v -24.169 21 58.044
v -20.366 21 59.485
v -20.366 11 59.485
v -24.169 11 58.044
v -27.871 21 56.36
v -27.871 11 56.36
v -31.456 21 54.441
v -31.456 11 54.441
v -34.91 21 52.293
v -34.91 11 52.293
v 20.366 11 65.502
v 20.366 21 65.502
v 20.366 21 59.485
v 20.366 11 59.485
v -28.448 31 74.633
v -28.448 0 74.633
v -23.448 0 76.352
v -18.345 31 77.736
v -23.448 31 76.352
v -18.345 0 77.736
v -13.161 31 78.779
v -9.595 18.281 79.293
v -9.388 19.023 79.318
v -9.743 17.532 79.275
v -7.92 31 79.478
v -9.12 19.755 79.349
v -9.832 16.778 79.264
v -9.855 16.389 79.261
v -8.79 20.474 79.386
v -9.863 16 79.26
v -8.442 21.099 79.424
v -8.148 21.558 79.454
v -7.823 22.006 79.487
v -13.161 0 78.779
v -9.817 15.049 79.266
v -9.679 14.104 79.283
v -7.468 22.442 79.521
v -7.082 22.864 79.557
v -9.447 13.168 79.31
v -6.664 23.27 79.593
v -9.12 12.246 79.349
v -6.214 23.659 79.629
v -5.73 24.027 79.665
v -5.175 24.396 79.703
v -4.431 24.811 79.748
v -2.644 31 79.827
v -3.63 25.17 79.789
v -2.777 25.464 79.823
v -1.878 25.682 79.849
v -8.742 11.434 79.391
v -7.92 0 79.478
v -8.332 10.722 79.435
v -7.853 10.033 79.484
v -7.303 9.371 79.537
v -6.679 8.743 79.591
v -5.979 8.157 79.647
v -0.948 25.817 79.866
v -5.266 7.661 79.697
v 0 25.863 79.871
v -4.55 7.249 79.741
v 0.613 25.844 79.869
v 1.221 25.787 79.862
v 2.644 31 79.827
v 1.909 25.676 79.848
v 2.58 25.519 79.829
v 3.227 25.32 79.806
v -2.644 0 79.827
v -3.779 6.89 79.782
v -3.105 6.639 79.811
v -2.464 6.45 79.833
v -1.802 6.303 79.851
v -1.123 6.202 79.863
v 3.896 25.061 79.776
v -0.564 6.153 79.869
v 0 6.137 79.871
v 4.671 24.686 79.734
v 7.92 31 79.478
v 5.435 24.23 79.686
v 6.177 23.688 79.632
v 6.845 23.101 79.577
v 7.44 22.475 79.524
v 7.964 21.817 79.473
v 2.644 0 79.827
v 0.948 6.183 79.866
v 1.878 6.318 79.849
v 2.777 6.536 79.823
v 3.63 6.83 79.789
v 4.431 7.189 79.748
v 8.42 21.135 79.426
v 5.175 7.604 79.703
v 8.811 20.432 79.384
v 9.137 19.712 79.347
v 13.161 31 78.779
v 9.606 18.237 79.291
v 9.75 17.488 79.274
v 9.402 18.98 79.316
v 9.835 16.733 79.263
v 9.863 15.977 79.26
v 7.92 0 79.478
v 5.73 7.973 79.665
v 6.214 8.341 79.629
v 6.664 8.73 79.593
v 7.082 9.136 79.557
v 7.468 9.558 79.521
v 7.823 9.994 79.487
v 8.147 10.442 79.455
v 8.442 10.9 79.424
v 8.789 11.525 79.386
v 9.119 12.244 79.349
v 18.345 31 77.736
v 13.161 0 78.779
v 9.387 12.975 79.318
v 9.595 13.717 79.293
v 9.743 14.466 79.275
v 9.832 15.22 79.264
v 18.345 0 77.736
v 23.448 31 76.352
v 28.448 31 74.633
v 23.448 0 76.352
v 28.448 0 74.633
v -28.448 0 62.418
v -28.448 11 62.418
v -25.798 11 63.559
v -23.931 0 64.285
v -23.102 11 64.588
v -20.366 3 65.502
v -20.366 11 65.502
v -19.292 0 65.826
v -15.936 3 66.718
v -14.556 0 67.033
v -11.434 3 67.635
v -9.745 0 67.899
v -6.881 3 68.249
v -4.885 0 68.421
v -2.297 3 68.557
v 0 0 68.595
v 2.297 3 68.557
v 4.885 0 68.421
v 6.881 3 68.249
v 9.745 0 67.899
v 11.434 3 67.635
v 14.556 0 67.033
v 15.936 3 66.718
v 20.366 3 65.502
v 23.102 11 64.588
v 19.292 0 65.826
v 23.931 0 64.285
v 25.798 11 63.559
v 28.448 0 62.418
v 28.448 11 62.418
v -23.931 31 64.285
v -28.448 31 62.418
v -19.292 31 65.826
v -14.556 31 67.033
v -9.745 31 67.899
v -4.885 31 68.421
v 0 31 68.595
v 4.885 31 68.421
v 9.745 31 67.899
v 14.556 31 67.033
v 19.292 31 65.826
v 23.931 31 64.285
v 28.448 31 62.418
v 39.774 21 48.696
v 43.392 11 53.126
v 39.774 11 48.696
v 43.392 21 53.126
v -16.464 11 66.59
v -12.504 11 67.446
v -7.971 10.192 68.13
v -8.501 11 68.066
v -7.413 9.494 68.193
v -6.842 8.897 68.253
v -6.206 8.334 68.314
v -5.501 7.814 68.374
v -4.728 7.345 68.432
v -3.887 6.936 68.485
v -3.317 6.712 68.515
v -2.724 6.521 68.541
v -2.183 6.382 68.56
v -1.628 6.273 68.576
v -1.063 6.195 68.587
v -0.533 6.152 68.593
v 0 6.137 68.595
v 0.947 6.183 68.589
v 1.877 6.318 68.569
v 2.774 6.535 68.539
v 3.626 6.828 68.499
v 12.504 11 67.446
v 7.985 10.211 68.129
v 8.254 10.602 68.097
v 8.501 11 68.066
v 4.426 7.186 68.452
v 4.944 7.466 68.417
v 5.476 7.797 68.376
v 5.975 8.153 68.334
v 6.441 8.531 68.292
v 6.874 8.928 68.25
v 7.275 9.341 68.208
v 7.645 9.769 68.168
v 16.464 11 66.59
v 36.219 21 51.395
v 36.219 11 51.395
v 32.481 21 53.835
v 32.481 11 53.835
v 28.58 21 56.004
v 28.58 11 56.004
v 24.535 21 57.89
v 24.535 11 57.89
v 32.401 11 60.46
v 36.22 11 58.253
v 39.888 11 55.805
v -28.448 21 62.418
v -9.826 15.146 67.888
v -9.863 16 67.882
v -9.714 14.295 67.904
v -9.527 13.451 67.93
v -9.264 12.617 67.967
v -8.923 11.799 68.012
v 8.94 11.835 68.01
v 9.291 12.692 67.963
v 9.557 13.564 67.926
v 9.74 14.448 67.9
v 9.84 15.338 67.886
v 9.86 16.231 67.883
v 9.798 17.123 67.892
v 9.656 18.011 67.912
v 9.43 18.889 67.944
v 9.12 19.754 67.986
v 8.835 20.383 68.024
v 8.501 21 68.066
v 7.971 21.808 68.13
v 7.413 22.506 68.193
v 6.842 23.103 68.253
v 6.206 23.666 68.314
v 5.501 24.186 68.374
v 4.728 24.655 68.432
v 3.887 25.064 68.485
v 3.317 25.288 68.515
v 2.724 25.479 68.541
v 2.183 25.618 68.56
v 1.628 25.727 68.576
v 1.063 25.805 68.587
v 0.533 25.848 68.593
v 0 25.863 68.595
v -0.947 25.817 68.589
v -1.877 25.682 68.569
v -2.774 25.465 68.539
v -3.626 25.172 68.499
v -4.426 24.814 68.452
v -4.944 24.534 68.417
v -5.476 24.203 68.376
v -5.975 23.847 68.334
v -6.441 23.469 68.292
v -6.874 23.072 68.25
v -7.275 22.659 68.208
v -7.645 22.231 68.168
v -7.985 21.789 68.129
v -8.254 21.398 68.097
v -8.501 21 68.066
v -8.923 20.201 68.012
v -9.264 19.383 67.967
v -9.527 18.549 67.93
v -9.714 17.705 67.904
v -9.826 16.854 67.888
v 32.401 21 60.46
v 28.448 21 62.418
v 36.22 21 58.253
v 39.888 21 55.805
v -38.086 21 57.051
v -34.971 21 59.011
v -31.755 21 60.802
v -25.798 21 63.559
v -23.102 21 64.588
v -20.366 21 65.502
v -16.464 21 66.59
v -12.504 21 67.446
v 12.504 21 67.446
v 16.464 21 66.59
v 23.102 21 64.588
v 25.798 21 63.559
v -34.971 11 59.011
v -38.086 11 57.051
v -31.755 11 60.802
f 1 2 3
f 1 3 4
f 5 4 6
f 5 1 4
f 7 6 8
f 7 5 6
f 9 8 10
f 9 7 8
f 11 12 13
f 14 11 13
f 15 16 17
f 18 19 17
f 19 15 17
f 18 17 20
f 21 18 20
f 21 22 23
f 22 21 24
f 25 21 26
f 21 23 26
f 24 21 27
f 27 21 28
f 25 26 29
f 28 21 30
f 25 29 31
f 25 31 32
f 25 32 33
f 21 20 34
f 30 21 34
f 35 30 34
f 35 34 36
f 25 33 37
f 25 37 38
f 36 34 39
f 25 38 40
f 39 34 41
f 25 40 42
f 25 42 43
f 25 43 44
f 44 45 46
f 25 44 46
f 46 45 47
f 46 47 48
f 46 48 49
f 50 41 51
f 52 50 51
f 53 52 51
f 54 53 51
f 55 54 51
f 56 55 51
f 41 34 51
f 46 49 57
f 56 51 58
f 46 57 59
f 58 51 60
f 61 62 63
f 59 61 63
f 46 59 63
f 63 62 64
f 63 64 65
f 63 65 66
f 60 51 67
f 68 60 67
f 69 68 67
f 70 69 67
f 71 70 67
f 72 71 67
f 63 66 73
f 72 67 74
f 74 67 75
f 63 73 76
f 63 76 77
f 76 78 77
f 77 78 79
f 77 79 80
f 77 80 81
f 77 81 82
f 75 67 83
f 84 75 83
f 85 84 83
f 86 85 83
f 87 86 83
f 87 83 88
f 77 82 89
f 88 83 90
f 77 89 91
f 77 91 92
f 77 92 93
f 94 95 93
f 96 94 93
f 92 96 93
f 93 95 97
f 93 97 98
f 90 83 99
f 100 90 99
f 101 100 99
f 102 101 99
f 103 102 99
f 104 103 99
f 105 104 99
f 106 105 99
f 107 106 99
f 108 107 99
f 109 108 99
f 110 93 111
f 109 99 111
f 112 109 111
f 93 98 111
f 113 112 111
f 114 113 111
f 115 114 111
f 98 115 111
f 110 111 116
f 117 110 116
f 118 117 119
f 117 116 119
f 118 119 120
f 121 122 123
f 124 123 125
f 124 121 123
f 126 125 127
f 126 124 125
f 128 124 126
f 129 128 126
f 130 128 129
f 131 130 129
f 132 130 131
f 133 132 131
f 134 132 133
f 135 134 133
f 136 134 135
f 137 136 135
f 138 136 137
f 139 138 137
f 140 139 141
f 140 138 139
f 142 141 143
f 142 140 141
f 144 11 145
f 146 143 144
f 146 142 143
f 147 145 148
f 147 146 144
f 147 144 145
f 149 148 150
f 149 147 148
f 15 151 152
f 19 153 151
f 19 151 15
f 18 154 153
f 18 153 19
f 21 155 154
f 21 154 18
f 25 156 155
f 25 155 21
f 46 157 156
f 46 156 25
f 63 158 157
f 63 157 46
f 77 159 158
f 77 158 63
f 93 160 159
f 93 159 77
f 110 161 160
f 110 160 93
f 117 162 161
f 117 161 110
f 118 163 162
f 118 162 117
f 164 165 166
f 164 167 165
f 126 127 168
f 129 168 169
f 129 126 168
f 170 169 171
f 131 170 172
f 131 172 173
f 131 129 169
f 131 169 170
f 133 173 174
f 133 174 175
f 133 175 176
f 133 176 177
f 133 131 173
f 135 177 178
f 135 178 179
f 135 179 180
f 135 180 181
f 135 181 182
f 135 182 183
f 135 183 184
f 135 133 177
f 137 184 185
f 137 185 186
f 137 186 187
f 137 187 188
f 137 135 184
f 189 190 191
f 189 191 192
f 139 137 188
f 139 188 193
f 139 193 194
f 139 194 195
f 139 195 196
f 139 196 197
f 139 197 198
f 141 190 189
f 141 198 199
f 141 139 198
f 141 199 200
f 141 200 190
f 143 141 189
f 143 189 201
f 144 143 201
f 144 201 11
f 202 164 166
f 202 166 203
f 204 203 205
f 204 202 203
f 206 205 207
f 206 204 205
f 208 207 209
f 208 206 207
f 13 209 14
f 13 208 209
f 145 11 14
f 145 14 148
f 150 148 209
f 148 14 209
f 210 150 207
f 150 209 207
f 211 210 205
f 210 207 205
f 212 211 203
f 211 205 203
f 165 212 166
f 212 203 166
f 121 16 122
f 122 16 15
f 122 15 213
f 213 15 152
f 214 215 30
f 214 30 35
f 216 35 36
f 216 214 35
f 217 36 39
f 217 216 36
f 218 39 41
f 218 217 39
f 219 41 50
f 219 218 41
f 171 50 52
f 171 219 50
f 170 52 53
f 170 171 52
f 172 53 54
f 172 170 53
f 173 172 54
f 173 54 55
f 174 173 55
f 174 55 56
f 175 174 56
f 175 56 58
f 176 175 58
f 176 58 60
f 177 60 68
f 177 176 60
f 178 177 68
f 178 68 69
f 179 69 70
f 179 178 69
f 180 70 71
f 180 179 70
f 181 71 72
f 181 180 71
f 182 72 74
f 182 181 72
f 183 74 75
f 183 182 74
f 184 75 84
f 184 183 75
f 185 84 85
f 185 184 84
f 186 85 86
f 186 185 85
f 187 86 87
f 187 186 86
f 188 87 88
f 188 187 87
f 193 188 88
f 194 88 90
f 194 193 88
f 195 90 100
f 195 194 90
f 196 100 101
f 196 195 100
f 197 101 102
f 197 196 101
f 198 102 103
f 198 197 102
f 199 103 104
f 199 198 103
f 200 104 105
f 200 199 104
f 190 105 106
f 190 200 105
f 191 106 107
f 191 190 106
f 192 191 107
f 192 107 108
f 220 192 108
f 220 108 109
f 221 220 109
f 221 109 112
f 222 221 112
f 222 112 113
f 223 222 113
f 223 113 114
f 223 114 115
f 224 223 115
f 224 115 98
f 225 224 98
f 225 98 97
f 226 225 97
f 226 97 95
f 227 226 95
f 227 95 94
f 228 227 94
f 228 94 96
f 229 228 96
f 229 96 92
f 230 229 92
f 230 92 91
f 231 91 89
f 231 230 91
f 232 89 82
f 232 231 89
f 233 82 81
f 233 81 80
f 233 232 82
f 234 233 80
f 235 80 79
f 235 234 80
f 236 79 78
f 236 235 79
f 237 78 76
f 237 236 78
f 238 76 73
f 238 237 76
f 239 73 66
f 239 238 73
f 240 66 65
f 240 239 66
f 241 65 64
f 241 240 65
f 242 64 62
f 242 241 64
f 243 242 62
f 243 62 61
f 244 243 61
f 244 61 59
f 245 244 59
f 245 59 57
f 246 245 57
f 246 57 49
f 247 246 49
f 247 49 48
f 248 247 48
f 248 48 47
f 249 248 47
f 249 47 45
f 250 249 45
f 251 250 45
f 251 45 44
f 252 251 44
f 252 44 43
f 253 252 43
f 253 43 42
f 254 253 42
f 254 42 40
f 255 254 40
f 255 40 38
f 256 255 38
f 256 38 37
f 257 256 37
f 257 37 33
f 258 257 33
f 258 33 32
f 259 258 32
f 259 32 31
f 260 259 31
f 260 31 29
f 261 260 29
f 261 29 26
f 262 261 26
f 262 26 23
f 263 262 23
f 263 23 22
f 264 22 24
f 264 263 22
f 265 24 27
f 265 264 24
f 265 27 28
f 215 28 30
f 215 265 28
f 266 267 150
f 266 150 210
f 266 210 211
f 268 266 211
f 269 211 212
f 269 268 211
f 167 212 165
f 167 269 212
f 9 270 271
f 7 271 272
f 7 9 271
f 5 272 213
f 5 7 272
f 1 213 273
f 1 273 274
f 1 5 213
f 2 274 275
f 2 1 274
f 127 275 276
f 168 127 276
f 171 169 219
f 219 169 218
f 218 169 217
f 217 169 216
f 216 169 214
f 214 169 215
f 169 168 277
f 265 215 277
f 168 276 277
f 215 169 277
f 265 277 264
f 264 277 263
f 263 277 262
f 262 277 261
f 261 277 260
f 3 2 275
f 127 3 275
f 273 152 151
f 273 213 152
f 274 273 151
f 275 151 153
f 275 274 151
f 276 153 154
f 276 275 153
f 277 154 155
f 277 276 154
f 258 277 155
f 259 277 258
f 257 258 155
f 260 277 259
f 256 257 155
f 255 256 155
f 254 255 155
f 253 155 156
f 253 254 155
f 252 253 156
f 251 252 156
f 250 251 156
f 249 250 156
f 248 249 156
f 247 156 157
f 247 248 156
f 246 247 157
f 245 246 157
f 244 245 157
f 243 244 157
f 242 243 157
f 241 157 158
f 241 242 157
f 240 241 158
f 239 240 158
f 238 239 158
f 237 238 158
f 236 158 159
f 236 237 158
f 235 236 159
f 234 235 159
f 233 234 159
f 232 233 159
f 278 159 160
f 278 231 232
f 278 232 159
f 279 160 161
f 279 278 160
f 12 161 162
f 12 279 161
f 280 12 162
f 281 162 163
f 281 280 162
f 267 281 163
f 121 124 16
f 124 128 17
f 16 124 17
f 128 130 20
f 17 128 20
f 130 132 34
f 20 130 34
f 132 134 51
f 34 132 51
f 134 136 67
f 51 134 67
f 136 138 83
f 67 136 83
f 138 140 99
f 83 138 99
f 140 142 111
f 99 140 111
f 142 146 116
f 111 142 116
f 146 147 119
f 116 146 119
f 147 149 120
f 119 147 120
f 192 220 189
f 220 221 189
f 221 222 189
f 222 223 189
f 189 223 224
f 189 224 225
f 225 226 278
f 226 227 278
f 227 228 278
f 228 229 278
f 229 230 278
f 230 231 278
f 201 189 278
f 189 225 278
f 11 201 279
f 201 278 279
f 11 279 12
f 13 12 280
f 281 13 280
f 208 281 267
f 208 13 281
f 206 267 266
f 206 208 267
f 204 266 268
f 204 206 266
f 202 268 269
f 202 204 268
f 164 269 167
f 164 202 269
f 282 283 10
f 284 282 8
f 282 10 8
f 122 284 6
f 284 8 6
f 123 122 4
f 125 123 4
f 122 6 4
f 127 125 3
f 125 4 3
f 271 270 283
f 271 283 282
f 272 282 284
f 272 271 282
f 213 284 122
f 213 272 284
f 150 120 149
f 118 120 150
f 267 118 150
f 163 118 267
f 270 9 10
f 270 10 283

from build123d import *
from build123d.topology import SkipClean

# Parameters (mm, degrees)
SKETCH1_R           = 79.871147442
SKETCH1_R_2         = 68.595086453
BOSS_EXTRUDE1_DEPTH = 31
SKETCH2_W           = 233.196890583
SKETCH2_H           = 222.59703192
SKETCH2_W_2         = 56.896718534
SKETCH2_H_2         = 45.723887068
CUT_EXTRUDE1_DEPTH  = 31
BOSS_EXTRUDE2_DEPTH = 5
CUT_EXTRUDE3_DEPTH  = 18
SKETCH6_R           = 9.86264383
CUT_EXTRUDE4_DEPTH  = 128


with BuildPart() as part:
    # Sketch1 → Boss-Extrude1 (new body)
    with BuildSketch(Plane(origin=(0, 0, 0), x_dir=(1, 0, 0), z_dir=(0, 1, 0))):
        with Locations(Location((0, 0, 0), (0, 0, 270))):
            Circle(SKETCH1_R)
        with Locations(Location((0, 0, 0), (0, 0, 270))):
            Circle(SKETCH1_R_2, mode=Mode.SUBTRACT)
    extrude(amount=BOSS_EXTRUDE1_DEPTH)

    # Sketch2 → Cut-Extrude1 (cut)
    with BuildSketch(Plane(origin=(0, 31, 0), x_dir=(1, 0, 0), z_dir=(0, 1, 0))):
        with Locations((-10.138995242, -14.747629444)):
            Rectangle(SKETCH2_W, SKETCH2_H)
        with Locations((0, -68.595086453)):
            Rectangle(SKETCH2_W_2, SKETCH2_H_2, mode=Mode.SUBTRACT)
    extrude(amount=-CUT_EXTRUDE1_DEPTH, mode=Mode.SUBTRACT)

    # Sketch4 → Boss-Extrude2 (add, symmetric)
    with BuildSketch(Plane(origin=(0, 16, 0), x_dir=(1, 0, 0), z_dir=(0, 1, 0))):
        with BuildLine():
            Line((43.392343097, -53.126174774), (39.773823752, -48.69594406))
            ThreePointArc((39.773823752, -48.69594406), (3.024910809, -62.802085461), (-34.909607277, -52.293129027))
            Line((-34.909607277, -52.293129027), (-38.085592821, -57.050622301))
            ThreePointArc((-38.085592821, -57.050622301), (3.30010935, -68.51565634), (43.392343097, -53.126174774))
        make_face()
    extrude(amount=BOSS_EXTRUDE2_DEPTH, both=True)

    # Sketch5 → Cut-Extrude3 (cut)
    with SkipClean():  # the faces are left unmerged after this step: merging them gives an invalid solid
        with BuildSketch(Plane(origin=(0, 21, 0), x_dir=(1, 0, 0), z_dir=(0, 1, 0))):
            with BuildLine():
                ThreePointArc((-20.365734208, -65.502082071), (0, -68.595086453), (20.365734208, -65.502082071))
                Line((20.365734208, -65.502082071), (20.365734208, -59.485198948))
                ThreePointArc((20.365734208, -59.485198948), (0, -62.874891839), (-20.365734208, -59.485198948))
                Line((-20.365734208, -59.485198948), (-20.365734208, -65.502082071))
            make_face()
        extrude(amount=-CUT_EXTRUDE3_DEPTH, mode=Mode.SUBTRACT)

    # Sketch6 → Cut-Extrude4 (cut)
    with SkipClean():  # the faces are left unmerged after this step: merging them gives an invalid solid
        with BuildSketch(Plane.XY):
            with Locations(Location((0, 16, 0), (0, 0, 180))):
                Circle(SKETCH6_R)
        extrude(amount=CUT_EXTRUDE4_DEPTH, mode=Mode.SUBTRACT)


solid = part.part
